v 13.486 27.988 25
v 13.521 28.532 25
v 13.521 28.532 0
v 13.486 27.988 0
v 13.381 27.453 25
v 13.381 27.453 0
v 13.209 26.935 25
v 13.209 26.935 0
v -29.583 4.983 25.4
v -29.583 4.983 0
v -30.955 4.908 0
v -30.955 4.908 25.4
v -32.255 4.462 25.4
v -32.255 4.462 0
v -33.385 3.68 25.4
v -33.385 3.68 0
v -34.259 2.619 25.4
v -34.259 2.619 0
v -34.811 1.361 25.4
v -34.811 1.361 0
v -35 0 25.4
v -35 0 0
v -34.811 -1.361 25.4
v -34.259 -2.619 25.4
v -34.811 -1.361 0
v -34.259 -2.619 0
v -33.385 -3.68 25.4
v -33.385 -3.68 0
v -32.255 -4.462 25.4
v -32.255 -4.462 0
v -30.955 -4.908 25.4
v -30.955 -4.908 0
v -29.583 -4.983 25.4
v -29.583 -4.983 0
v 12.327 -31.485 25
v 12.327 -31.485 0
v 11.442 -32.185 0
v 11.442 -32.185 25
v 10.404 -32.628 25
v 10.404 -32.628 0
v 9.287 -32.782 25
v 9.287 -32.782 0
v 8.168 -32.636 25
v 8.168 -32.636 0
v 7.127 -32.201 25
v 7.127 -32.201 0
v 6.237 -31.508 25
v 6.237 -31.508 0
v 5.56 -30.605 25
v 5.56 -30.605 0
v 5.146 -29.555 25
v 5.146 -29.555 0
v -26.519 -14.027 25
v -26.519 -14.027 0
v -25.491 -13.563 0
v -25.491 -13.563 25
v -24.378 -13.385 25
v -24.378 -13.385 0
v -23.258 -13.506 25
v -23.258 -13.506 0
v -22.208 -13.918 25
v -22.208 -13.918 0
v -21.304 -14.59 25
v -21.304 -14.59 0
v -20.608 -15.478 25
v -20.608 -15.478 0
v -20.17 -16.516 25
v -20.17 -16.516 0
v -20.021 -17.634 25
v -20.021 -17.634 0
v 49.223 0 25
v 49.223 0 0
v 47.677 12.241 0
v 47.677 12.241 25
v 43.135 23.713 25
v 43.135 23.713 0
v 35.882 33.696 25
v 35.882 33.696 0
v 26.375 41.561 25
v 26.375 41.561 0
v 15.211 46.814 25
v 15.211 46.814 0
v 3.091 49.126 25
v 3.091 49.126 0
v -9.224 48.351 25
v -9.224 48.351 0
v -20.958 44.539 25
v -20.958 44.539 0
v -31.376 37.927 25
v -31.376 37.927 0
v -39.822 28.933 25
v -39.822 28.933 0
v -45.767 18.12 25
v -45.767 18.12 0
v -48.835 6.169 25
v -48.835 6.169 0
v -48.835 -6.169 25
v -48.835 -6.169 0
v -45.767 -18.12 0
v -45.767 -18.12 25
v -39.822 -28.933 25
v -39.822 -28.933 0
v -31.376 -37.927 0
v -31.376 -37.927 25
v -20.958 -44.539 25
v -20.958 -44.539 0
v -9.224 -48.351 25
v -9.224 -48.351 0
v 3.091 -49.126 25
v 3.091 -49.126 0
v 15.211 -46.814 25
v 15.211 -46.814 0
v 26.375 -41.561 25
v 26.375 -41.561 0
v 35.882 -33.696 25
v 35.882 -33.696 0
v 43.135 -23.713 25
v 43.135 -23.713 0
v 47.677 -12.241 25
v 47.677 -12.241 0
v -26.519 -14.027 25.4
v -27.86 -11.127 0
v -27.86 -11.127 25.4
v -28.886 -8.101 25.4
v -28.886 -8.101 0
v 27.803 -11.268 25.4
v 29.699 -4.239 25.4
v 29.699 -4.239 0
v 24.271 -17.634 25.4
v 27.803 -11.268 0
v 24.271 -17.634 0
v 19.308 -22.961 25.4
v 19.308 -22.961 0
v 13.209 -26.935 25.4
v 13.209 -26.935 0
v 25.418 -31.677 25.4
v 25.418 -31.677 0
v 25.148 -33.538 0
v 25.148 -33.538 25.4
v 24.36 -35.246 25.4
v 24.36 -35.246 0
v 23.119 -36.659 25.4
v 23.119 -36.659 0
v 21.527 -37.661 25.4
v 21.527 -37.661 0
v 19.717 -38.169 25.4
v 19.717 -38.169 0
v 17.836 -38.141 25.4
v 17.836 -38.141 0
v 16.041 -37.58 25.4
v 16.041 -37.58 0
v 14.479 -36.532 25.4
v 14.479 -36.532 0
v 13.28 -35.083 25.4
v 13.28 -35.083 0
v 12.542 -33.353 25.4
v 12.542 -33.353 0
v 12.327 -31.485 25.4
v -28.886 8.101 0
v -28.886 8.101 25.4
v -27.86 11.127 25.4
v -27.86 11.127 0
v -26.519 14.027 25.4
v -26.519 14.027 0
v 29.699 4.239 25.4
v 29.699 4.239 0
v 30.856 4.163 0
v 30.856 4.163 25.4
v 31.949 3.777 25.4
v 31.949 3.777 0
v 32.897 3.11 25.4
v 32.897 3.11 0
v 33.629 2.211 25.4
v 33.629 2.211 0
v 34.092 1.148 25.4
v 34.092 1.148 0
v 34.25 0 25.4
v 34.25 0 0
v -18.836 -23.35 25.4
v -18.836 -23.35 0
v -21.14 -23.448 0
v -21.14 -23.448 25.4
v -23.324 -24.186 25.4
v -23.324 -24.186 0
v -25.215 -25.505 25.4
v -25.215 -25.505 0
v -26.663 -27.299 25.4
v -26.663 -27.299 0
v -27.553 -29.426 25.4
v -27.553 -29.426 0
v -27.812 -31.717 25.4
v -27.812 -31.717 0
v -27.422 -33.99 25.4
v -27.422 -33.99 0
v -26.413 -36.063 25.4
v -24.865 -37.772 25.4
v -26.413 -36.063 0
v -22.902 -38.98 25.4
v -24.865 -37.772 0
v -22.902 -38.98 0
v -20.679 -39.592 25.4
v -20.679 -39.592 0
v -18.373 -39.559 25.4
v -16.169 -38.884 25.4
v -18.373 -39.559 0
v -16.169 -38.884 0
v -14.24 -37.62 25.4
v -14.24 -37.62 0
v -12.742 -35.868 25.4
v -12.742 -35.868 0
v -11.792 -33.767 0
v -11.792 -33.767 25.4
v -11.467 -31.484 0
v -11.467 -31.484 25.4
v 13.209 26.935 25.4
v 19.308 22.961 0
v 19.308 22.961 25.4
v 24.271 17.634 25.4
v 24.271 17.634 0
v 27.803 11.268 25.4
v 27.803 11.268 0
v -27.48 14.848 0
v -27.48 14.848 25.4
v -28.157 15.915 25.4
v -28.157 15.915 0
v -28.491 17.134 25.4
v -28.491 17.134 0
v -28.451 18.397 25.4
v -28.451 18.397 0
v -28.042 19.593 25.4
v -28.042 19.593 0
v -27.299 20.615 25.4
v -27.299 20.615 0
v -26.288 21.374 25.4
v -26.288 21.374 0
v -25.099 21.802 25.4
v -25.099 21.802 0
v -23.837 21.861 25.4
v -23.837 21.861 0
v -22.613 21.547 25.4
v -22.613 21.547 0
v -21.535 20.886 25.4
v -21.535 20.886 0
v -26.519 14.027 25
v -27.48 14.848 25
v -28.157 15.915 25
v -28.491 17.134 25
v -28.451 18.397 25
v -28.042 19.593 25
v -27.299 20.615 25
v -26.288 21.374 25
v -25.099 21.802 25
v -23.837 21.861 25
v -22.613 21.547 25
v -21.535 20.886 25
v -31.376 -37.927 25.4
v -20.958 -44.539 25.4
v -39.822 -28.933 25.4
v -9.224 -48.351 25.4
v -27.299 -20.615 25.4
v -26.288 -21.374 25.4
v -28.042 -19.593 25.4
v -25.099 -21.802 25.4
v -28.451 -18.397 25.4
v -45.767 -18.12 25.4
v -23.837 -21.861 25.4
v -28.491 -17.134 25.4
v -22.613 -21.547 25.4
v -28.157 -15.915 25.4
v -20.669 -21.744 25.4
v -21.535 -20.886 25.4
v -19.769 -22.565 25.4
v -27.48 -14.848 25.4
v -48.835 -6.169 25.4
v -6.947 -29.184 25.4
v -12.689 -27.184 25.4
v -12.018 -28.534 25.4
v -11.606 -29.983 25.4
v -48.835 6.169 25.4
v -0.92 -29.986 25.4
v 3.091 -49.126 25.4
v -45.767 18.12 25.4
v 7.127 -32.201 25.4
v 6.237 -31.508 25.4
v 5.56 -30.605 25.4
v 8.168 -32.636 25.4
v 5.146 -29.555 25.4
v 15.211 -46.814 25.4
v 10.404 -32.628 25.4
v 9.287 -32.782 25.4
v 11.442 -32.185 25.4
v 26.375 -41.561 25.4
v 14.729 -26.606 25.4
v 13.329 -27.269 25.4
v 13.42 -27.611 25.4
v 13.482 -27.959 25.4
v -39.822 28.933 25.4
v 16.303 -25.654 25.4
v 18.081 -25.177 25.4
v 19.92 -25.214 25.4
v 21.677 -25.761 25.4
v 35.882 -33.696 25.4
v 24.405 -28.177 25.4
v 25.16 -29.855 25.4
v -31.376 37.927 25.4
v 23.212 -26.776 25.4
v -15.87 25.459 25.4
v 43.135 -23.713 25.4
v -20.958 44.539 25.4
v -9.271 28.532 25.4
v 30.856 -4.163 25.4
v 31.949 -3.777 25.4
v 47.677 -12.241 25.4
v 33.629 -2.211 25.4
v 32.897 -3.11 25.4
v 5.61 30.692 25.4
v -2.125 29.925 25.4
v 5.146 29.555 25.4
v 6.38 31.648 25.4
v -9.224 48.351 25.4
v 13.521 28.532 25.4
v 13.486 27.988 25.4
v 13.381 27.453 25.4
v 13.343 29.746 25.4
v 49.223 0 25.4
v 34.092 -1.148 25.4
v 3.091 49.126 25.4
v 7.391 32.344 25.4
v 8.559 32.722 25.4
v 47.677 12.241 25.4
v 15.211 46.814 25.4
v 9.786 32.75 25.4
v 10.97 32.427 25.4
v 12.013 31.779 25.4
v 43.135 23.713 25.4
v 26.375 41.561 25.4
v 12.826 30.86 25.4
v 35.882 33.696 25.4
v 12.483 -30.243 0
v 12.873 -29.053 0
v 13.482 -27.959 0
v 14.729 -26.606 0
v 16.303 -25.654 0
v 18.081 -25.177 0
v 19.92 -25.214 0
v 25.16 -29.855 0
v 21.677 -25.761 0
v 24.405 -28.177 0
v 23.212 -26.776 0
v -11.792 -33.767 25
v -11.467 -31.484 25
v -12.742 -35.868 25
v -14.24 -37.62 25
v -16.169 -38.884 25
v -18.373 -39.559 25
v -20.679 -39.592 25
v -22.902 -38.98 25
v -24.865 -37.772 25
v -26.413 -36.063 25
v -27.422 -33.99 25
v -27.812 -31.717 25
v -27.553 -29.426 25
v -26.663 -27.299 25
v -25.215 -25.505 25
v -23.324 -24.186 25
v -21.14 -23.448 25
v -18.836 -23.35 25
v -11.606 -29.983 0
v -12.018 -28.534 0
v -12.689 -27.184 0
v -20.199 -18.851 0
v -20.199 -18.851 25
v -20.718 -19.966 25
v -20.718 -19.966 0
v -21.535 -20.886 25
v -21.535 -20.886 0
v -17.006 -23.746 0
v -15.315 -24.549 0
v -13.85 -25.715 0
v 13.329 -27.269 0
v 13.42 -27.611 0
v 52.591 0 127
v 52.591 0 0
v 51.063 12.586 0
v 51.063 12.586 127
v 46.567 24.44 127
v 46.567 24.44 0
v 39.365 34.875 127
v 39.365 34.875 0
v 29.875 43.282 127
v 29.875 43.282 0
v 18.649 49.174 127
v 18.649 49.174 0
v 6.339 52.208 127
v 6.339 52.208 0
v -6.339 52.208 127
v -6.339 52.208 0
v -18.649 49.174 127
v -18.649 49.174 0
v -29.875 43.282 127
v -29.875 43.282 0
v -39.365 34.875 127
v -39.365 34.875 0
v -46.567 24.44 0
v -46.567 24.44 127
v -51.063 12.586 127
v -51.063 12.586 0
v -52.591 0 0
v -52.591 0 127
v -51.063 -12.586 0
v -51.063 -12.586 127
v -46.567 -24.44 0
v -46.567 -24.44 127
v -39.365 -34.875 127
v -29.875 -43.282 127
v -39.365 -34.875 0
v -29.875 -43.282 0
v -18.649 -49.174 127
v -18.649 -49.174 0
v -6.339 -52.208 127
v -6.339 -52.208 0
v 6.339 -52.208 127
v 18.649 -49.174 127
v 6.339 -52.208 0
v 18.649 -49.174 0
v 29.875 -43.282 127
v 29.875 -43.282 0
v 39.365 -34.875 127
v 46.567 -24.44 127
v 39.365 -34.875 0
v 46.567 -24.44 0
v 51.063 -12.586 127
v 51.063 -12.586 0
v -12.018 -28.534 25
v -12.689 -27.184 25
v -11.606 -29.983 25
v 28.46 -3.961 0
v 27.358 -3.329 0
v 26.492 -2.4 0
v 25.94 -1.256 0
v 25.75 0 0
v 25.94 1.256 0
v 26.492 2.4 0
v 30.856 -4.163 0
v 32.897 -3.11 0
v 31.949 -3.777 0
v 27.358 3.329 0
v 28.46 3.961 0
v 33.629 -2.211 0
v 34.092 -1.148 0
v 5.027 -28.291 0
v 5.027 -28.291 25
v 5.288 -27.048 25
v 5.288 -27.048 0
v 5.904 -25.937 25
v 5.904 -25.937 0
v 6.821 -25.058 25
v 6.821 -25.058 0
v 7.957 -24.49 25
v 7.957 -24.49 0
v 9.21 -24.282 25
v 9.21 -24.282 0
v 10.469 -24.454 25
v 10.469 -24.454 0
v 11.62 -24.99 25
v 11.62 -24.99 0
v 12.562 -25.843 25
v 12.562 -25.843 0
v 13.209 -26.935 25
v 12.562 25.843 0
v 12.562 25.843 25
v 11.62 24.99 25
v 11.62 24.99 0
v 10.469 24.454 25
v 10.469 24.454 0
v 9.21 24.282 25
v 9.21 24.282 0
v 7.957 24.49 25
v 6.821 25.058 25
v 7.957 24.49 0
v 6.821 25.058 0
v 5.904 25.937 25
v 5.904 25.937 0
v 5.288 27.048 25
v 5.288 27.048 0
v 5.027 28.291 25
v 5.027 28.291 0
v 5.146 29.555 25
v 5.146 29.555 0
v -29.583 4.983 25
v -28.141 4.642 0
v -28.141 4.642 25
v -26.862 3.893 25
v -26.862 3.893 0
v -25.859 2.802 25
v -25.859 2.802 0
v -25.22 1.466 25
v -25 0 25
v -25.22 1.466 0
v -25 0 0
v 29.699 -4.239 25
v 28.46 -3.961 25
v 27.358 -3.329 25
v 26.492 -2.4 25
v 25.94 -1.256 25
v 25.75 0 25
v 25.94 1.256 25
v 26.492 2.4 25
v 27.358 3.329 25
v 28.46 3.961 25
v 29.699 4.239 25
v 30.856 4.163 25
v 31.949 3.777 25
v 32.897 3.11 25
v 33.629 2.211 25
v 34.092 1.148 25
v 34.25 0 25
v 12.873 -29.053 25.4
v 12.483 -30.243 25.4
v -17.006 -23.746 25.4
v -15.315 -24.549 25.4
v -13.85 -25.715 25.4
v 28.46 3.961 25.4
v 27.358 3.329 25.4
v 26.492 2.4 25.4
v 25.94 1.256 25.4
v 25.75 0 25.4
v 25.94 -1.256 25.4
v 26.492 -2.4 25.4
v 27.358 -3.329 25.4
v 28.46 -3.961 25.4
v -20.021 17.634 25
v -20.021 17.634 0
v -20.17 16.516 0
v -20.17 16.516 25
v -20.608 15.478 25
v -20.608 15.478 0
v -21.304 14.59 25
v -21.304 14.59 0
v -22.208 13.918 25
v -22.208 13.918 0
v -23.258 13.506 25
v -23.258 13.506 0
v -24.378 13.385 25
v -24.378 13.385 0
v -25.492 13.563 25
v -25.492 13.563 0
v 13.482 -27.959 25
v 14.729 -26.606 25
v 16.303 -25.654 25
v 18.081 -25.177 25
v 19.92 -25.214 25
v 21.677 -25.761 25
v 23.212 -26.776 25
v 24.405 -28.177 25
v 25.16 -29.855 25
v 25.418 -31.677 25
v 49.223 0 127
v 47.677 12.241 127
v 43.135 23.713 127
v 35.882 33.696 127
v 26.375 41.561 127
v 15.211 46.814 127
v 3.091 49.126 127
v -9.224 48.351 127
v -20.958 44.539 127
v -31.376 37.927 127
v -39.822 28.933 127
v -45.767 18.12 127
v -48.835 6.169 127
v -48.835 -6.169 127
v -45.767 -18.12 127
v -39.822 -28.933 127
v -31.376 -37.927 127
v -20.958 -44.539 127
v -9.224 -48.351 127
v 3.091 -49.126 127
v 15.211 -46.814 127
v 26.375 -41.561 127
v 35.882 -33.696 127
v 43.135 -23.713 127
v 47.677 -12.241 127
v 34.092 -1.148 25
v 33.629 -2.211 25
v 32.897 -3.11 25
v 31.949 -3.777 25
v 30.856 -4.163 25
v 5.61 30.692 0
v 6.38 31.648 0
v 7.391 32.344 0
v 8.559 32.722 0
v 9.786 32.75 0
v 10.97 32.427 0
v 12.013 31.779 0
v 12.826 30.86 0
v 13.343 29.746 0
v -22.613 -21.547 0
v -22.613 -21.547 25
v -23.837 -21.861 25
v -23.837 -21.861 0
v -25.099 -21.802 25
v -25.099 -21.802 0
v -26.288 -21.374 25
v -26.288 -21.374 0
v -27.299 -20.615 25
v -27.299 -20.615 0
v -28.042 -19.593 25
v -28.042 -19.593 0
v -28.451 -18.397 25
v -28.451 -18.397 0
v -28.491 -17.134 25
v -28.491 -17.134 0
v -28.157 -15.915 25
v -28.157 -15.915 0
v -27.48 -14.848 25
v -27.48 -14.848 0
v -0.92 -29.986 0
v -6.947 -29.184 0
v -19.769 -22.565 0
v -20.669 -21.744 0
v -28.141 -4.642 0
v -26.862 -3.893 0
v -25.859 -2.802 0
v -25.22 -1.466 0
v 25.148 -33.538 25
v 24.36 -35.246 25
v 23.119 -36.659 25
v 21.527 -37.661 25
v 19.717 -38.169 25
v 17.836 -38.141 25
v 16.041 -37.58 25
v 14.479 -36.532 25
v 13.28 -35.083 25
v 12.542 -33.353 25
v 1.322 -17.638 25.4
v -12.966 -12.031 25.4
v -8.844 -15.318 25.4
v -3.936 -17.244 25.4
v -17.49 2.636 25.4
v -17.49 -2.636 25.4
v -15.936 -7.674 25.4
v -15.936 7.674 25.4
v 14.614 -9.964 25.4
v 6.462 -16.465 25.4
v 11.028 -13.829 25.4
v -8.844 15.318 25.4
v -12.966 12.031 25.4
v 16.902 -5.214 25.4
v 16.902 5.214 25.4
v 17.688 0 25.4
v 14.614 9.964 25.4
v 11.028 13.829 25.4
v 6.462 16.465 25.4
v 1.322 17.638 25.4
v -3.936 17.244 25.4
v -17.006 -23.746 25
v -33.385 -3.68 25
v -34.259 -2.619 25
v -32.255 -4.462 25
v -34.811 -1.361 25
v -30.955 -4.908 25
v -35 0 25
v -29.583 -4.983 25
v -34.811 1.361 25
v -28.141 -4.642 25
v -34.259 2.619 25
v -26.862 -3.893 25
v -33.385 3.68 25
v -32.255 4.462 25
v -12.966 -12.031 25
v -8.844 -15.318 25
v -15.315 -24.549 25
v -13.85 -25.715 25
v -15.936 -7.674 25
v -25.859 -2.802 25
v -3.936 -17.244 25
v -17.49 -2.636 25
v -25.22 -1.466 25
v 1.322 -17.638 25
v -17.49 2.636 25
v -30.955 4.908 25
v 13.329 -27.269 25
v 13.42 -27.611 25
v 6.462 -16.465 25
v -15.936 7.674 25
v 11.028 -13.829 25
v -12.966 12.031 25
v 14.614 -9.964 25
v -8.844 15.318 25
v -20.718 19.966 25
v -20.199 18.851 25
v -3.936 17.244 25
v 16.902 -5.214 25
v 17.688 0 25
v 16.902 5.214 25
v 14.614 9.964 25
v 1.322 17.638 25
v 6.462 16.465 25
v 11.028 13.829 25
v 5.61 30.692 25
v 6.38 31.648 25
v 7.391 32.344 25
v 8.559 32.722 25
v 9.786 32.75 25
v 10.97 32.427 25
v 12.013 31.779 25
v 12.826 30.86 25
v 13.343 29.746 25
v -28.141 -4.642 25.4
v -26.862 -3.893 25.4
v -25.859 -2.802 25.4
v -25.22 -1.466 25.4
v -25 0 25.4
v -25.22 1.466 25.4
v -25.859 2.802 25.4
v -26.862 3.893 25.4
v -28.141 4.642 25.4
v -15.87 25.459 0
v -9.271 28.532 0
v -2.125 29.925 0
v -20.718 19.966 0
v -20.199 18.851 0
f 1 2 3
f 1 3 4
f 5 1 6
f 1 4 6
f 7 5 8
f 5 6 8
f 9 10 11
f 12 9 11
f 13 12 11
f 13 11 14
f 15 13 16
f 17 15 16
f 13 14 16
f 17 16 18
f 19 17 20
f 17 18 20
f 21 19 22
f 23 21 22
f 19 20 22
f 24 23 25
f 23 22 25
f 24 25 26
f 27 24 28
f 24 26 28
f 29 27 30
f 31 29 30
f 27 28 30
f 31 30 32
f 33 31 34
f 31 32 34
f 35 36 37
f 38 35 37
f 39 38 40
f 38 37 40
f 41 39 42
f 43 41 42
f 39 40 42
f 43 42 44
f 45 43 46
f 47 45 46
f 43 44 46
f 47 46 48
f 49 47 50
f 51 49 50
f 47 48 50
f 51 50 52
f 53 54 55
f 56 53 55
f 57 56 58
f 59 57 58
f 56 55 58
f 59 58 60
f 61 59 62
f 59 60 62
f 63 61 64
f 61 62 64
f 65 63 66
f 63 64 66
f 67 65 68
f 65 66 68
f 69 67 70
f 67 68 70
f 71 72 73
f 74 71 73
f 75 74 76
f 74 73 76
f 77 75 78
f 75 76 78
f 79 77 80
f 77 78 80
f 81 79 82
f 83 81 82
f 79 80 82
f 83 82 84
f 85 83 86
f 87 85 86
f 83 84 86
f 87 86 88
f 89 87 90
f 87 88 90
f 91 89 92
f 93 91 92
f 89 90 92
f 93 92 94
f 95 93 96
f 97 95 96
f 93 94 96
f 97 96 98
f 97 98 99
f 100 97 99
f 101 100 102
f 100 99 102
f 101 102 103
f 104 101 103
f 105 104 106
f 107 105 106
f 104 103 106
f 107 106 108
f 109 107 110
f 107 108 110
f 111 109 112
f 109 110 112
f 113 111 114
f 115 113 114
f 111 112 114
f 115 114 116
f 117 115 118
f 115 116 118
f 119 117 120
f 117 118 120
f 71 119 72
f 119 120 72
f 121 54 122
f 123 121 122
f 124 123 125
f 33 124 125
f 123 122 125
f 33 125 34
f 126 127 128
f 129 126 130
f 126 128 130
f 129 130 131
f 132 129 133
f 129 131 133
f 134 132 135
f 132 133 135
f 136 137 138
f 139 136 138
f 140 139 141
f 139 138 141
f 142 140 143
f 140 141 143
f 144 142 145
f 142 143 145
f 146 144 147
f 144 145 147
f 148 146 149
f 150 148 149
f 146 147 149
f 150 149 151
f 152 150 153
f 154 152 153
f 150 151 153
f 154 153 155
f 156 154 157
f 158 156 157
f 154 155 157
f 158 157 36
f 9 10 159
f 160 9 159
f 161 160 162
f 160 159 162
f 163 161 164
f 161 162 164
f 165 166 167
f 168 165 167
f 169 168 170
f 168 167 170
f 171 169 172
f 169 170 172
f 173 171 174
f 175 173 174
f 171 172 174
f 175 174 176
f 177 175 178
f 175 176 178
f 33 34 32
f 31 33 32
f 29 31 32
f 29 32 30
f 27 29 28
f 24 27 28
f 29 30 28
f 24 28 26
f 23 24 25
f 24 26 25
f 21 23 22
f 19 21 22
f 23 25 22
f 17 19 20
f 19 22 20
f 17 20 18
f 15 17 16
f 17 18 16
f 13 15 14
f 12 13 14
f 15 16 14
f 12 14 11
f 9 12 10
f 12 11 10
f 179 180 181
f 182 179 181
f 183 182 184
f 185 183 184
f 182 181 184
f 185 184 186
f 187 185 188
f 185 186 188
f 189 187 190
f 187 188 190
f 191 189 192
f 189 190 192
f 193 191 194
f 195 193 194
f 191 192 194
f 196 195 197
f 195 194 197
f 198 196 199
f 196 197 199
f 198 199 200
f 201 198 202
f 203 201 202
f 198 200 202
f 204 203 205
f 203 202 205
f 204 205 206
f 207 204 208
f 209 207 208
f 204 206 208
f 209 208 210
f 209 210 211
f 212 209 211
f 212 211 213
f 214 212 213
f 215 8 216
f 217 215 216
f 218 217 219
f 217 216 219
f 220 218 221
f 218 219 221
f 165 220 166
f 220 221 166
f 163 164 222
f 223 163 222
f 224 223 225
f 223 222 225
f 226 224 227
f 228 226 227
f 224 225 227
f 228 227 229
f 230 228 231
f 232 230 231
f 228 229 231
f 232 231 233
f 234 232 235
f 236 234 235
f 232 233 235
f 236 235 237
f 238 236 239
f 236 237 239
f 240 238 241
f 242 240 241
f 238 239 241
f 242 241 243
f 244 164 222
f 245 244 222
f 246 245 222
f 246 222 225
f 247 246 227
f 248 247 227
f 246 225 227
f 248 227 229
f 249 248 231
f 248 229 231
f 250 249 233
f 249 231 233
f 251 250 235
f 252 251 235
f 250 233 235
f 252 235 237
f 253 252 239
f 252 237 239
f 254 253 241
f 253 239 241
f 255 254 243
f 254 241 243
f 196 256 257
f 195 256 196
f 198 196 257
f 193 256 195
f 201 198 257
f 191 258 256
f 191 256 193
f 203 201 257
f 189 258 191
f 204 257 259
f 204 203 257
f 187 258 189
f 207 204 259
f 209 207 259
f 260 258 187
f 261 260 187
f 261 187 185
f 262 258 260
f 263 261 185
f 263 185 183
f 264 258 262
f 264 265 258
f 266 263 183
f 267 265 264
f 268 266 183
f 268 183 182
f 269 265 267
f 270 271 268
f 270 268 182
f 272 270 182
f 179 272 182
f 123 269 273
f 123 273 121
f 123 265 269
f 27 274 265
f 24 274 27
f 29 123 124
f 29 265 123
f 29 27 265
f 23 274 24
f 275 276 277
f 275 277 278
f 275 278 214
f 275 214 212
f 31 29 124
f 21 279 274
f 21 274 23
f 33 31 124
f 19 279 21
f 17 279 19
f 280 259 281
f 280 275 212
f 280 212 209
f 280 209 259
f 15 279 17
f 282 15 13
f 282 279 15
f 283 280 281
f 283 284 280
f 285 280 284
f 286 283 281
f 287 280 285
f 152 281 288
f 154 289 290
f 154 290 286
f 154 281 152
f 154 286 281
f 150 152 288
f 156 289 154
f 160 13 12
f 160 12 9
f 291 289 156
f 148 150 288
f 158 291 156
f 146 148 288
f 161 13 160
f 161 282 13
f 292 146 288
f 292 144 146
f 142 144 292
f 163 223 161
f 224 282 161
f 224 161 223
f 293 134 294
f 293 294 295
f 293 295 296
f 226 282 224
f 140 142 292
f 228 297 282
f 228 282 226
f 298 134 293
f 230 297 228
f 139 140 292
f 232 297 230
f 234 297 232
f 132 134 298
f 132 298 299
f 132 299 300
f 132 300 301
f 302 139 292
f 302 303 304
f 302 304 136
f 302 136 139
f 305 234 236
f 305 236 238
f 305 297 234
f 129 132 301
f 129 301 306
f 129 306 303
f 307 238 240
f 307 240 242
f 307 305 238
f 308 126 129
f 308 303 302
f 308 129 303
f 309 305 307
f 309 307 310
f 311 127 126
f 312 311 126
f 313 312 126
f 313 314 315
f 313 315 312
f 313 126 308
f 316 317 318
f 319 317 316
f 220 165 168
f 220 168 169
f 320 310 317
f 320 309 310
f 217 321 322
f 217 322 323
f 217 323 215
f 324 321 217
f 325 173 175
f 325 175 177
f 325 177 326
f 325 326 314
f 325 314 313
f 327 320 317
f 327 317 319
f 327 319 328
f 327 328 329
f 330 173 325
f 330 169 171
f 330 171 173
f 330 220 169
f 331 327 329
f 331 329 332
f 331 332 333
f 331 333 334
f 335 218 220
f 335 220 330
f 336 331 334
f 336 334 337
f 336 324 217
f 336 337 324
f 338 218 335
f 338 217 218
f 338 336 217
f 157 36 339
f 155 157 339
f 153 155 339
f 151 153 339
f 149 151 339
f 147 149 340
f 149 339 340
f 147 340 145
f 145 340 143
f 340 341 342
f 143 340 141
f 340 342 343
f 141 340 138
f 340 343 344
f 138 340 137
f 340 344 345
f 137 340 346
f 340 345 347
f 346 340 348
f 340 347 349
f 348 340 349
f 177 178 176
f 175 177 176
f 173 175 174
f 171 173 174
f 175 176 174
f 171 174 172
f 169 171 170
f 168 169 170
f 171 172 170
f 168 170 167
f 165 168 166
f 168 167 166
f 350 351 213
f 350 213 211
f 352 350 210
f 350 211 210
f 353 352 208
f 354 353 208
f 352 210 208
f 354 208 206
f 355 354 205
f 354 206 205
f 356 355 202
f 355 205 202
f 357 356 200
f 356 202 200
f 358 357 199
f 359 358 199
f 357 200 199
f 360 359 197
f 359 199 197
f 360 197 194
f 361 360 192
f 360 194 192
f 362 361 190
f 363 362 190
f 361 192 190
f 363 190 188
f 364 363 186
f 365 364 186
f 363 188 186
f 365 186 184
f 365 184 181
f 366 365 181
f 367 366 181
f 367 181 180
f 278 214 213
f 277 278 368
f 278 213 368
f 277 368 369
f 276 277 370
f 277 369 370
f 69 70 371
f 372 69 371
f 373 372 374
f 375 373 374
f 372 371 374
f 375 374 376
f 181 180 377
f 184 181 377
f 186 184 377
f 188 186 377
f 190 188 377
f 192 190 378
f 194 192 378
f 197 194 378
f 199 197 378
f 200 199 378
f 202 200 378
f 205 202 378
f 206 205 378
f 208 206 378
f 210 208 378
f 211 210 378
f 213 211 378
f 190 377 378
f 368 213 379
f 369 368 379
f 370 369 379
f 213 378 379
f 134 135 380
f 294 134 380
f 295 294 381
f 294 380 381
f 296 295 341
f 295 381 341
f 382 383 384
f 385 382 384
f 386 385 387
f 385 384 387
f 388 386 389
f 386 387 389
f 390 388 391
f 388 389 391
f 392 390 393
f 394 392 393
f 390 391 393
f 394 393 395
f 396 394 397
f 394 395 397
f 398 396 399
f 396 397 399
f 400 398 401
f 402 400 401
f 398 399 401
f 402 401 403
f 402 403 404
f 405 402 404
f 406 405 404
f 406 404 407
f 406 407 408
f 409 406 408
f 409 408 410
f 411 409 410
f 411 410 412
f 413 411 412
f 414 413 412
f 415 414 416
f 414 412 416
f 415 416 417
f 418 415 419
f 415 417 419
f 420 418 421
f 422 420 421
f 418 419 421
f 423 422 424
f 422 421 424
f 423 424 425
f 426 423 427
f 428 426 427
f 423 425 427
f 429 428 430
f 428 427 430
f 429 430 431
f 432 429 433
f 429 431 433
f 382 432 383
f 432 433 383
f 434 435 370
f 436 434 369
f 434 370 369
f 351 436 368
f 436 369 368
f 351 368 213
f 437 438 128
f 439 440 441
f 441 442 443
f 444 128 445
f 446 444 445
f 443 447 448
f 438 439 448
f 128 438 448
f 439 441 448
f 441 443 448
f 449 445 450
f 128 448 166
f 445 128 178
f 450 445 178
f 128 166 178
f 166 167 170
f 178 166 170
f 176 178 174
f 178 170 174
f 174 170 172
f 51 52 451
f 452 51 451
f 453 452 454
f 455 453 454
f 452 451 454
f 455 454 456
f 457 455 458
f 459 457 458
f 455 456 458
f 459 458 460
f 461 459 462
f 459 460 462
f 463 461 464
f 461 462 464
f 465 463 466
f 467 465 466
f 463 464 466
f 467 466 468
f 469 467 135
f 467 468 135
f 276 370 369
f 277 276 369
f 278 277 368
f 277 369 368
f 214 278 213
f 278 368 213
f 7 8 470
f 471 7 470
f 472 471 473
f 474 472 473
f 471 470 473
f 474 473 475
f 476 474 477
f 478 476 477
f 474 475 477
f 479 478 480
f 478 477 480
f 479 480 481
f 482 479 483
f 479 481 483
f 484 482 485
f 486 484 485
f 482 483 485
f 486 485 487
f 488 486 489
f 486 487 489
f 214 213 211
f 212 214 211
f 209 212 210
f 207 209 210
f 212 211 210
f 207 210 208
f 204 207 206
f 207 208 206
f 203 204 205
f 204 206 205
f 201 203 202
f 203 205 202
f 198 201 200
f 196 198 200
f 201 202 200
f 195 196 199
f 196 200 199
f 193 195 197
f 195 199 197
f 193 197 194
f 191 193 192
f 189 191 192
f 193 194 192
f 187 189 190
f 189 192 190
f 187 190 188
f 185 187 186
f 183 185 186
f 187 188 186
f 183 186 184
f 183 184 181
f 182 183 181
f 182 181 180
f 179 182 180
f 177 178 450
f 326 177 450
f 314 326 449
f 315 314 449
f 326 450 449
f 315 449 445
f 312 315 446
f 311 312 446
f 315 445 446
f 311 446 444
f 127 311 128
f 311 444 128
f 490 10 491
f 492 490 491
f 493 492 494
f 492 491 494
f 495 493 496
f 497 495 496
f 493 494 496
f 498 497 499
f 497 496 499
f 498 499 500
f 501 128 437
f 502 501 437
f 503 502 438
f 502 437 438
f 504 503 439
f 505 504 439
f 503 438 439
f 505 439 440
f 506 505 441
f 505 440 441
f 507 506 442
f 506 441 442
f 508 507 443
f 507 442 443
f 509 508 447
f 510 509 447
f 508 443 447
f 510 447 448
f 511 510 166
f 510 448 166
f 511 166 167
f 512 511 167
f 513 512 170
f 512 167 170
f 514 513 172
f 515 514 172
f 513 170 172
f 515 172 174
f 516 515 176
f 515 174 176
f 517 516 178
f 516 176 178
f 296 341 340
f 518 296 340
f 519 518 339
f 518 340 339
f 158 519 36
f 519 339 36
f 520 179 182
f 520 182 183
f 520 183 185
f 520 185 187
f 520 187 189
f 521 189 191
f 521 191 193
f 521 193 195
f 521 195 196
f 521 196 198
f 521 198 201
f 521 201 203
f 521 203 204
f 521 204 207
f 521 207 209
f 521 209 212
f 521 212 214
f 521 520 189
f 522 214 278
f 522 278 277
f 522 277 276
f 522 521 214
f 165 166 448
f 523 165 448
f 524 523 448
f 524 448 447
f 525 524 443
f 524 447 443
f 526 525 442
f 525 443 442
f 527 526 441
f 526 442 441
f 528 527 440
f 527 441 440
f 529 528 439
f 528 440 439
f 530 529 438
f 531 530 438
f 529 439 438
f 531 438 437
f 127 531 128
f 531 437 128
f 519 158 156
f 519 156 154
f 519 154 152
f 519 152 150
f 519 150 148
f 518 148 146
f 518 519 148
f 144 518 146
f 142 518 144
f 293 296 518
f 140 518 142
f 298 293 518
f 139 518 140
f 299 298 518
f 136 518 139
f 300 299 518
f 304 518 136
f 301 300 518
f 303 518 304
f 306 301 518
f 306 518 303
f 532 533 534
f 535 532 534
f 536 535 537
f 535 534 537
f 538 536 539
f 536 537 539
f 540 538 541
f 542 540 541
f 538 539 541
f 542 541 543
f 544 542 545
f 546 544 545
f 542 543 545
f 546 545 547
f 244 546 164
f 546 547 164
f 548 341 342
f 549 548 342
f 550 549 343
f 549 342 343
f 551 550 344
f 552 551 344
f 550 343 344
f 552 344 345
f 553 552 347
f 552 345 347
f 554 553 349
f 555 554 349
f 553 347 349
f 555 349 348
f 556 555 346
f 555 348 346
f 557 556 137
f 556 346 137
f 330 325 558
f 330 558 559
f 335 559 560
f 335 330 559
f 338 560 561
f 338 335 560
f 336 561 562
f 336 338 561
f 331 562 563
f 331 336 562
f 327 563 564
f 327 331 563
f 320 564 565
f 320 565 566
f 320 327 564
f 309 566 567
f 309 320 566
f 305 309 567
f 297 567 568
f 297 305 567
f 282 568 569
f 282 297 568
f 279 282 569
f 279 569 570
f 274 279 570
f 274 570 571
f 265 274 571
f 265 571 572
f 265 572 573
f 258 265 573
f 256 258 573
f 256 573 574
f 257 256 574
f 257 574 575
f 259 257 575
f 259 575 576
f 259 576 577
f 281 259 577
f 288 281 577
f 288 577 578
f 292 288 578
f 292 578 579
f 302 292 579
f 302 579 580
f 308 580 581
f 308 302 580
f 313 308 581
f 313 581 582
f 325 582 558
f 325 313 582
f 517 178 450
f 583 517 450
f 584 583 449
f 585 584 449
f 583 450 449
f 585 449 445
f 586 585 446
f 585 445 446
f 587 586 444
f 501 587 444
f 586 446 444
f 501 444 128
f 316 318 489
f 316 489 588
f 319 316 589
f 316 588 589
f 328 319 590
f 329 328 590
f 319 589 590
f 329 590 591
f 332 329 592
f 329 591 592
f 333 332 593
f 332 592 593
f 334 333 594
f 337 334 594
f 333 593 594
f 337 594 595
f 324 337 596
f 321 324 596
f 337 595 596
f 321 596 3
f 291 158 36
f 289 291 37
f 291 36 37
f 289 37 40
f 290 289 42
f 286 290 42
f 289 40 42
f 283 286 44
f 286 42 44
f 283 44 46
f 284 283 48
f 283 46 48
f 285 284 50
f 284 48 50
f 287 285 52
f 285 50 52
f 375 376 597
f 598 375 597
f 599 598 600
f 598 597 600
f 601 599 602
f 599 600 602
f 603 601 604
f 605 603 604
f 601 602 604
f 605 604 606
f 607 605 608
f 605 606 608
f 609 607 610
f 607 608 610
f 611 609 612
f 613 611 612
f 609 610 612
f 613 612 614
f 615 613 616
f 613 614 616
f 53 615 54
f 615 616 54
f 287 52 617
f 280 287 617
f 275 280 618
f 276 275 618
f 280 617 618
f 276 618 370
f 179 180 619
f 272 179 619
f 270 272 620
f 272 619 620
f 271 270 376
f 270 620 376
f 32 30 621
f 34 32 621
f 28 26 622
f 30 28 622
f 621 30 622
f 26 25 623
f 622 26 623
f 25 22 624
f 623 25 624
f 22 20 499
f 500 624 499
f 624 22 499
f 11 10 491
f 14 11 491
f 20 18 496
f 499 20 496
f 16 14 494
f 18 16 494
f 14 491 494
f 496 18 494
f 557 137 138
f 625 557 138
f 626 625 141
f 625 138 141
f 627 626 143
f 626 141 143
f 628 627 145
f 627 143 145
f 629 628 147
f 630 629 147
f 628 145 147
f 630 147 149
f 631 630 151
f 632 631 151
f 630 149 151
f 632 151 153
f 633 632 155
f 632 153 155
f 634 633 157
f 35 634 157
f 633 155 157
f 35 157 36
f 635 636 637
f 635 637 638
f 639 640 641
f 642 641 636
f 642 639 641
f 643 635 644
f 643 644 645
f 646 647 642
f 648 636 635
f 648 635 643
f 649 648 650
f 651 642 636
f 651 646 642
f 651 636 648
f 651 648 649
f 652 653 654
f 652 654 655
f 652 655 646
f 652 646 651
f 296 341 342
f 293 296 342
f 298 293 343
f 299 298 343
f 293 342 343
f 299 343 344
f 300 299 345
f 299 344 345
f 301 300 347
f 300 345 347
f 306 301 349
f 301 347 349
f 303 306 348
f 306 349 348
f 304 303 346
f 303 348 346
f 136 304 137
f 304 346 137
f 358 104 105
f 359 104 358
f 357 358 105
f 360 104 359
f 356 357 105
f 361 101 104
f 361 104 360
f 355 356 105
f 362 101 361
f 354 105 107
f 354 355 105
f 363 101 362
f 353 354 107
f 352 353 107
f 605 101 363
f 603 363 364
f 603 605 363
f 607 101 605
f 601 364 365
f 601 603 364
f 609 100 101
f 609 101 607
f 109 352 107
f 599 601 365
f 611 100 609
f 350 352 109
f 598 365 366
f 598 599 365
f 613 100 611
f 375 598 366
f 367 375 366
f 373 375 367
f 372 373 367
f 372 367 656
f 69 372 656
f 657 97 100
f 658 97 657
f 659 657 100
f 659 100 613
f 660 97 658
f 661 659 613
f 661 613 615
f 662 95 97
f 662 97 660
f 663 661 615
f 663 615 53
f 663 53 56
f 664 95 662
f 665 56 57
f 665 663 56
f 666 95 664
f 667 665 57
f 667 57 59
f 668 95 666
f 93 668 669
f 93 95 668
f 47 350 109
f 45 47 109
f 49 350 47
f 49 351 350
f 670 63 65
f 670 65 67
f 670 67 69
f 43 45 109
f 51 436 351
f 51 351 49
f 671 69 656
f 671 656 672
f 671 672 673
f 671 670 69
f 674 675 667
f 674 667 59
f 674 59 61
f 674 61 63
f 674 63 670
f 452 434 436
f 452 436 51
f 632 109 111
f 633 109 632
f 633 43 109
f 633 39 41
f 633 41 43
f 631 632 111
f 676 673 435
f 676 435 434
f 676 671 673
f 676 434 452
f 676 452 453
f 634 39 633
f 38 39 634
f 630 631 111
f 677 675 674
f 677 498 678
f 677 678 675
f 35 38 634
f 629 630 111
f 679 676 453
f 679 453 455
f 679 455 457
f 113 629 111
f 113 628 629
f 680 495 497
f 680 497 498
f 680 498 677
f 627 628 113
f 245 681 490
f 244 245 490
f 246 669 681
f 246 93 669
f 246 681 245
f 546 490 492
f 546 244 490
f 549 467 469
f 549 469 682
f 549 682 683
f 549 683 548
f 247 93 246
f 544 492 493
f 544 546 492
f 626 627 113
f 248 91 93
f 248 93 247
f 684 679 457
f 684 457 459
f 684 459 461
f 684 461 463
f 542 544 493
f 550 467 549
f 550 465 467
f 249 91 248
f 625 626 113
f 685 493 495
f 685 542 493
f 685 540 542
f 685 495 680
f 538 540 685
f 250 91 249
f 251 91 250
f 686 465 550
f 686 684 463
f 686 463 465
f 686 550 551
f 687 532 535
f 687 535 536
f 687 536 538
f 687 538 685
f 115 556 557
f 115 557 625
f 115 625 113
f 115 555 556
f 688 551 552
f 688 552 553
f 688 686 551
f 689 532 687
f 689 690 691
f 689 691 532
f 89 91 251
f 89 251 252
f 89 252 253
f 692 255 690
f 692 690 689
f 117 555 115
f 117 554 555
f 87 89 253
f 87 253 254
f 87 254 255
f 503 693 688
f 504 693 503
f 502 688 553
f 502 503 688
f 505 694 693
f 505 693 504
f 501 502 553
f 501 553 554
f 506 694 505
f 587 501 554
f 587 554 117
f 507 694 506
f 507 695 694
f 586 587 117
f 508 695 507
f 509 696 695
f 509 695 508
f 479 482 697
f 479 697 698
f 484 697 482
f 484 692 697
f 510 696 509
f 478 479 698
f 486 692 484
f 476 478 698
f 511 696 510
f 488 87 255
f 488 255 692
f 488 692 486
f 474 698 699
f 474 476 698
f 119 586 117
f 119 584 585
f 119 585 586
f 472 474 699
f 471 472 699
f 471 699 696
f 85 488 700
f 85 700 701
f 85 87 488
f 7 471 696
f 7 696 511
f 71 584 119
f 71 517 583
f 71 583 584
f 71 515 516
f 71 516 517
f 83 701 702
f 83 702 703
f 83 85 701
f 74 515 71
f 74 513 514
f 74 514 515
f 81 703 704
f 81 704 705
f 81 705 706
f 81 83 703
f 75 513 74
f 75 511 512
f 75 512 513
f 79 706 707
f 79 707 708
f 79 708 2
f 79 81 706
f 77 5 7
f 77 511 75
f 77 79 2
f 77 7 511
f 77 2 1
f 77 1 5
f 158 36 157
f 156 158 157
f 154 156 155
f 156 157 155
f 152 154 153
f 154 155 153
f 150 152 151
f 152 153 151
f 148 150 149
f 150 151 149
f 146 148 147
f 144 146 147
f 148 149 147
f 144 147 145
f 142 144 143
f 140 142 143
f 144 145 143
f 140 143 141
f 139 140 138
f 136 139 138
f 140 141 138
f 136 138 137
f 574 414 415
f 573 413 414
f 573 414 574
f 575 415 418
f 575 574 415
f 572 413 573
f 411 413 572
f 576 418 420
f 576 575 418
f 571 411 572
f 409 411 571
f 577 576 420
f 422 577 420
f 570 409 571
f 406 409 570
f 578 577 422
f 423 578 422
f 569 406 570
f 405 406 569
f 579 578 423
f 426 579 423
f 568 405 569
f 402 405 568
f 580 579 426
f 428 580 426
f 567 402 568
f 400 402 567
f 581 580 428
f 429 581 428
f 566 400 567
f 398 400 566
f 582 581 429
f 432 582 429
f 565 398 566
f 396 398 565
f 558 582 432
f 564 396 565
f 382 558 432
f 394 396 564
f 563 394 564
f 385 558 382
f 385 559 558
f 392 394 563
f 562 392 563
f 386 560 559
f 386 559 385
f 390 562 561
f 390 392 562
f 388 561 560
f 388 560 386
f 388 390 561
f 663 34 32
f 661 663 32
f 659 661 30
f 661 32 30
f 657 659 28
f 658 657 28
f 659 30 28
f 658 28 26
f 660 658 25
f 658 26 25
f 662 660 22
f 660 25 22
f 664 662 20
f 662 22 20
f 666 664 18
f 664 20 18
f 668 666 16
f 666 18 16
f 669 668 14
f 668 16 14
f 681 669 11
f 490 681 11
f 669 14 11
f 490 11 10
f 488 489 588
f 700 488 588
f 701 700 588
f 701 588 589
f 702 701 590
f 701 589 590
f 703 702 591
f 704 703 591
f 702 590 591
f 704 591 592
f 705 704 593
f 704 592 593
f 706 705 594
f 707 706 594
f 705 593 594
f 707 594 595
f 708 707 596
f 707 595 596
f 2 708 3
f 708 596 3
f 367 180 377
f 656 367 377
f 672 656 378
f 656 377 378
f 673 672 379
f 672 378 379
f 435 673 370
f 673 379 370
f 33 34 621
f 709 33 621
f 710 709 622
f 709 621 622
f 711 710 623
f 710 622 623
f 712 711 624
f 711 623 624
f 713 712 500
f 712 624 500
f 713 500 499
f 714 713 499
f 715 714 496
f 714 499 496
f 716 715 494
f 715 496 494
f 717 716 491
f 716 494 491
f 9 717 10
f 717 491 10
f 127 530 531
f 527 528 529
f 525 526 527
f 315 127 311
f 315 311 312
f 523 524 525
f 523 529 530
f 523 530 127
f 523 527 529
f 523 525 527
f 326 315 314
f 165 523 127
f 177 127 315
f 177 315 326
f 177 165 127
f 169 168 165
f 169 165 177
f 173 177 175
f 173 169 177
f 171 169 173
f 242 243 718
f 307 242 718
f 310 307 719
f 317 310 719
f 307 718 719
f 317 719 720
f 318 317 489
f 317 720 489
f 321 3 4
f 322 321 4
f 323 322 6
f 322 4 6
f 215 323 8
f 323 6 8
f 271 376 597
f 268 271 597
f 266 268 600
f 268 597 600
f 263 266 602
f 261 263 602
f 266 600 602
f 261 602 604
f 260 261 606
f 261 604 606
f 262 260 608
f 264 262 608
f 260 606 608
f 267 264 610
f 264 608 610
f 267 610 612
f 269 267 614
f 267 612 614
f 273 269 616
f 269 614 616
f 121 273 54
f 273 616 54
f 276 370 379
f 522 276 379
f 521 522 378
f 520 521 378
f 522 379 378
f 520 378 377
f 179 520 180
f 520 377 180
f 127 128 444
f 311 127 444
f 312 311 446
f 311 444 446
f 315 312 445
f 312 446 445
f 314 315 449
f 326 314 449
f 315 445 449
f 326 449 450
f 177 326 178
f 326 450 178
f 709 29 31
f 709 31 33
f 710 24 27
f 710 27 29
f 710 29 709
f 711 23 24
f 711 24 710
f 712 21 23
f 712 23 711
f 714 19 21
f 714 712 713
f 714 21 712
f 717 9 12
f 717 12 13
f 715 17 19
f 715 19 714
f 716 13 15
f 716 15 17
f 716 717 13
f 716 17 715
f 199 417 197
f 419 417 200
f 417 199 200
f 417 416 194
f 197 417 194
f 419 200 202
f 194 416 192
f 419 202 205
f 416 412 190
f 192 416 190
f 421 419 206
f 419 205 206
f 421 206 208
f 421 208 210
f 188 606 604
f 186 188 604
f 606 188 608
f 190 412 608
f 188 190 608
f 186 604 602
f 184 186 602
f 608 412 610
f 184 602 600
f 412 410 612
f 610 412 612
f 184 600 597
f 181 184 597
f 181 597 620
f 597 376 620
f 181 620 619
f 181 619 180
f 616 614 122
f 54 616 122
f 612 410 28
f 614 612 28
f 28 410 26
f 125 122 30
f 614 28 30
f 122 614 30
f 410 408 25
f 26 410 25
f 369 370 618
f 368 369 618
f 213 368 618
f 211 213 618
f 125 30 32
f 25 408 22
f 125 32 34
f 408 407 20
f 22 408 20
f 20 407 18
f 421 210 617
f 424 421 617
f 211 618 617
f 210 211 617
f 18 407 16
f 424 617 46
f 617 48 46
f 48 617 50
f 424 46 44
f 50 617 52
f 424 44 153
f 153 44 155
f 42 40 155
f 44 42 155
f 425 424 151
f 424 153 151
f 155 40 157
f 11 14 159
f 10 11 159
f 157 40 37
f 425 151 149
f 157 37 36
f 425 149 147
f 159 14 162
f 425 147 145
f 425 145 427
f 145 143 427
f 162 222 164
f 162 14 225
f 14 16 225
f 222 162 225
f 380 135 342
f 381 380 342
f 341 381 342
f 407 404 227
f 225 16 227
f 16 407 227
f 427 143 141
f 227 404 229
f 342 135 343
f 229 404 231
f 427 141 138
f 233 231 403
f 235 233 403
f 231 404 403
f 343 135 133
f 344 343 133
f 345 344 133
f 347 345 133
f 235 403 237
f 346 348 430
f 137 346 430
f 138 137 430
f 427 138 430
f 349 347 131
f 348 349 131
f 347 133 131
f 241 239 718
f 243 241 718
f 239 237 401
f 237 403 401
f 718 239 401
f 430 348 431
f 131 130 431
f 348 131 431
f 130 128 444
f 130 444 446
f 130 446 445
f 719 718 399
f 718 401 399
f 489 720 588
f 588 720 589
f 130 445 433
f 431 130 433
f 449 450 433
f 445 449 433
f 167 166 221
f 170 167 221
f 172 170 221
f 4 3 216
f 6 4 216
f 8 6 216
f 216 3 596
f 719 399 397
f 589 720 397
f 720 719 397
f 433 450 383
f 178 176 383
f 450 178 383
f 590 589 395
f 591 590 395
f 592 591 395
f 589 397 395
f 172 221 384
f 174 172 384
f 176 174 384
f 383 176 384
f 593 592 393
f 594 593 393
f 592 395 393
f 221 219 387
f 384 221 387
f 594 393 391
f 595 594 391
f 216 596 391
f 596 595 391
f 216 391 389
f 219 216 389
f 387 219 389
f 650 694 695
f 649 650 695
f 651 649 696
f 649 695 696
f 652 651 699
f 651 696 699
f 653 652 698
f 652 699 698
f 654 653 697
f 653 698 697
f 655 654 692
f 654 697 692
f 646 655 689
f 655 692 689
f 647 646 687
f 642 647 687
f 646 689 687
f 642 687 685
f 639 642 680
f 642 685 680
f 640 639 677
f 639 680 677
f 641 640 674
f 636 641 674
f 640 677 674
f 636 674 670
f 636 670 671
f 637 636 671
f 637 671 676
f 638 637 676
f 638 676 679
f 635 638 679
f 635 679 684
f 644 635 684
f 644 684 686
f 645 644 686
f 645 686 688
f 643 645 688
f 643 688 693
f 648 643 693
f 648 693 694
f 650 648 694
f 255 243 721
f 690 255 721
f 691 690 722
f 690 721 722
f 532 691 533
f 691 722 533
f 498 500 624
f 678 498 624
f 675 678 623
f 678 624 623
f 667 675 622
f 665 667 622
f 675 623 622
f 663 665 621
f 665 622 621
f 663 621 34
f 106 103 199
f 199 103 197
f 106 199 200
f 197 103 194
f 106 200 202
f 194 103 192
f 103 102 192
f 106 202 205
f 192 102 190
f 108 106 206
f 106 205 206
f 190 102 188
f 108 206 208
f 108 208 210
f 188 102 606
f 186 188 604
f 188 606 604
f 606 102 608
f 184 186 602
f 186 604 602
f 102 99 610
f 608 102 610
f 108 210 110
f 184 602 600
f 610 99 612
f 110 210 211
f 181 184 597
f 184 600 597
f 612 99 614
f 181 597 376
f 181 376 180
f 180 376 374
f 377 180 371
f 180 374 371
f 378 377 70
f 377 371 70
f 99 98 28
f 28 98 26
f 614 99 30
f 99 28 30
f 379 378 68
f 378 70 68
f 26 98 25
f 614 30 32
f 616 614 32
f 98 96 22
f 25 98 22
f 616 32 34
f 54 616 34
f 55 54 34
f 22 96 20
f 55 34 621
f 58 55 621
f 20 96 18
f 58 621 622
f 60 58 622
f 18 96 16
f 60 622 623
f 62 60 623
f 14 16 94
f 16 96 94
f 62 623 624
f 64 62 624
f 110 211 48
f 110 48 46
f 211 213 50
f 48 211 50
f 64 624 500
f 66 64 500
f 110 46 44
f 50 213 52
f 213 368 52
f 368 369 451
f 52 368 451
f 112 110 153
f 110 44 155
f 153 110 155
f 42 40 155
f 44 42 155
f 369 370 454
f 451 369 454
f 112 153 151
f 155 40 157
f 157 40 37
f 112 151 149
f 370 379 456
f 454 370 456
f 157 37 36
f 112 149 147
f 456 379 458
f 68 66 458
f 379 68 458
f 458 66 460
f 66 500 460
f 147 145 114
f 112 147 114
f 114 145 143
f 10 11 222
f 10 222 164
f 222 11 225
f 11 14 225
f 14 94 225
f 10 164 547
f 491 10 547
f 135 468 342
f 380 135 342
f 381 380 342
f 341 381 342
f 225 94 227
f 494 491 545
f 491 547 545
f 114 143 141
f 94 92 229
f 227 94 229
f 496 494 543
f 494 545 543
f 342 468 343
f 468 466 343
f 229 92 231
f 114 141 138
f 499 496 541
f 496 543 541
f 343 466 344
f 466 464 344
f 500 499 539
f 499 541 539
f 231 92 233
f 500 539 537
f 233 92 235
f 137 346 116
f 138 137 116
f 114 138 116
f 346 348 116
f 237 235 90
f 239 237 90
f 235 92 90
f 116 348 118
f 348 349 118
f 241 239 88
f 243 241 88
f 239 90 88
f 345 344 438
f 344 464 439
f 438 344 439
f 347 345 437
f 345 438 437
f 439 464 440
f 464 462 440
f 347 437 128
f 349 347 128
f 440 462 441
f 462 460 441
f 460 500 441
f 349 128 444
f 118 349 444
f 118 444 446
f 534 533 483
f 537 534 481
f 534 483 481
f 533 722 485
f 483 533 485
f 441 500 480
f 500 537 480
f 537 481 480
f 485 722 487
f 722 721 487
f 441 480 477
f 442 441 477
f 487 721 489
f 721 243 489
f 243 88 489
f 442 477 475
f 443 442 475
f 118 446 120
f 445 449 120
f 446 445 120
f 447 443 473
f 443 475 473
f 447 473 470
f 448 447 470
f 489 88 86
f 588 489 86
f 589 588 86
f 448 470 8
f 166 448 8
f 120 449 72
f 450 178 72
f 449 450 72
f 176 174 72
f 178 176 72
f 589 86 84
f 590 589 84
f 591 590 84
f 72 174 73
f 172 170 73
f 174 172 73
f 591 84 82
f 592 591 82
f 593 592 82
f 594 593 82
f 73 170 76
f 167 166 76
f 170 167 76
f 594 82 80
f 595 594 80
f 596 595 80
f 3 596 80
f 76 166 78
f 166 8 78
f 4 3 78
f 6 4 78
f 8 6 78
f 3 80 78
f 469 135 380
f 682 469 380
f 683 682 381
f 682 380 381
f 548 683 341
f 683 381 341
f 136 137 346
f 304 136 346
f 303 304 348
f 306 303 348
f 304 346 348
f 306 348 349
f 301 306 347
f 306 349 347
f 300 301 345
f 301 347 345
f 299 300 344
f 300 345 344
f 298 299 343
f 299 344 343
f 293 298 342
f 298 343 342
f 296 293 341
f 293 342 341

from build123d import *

# Parameters (mm, degrees)
F3_DEPTH = 25.4
F0_R     = 49.2232486947
F6_DEPTH = 25.4
F1_R     = 17.687795716
F0_R_2   = 52.5913484354
F7_DEPTH = 127
F9_DEPTH = 25


# Not quite as in the source:
# - a feature names something its author has since deleted; it is built from what else it names


with BuildPart() as f3:
    # F0 (on Top) → F3 (new body)
    with BuildSketch(Plane.XY):
        with BuildLine():
            ThreePointArc((-29.5833333333, -4.982608643), (-30, 0), (-29.5833333333, 4.982608643))
            ThreePointArc((-29.5833333333, 4.982608643), (-35, 0), (-29.5833333333, -4.982608643))
        make_face()
        with BuildLine():
            ThreePointArc((-25, 0), (-26.320099639, 3.3850160019), (-29.5833333333, 4.982608643))
            ThreePointArc((-29.5833333333, 4.982608643), (-30, 0), (-29.5833333333, -4.982608643))
            ThreePointArc((-29.5833333333, -4.982608643), (-26.320099639, -3.3850160019), (-25, 0))
        make_face()
    extrude(amount=F3_DEPTH)


with BuildPart() as f3b:
    # F0 (on Top) → F3, piece 2 (new body)
    with BuildSketch(Plane.XY):
        with BuildLine():
            ThreePointArc((-18.8360994911, -23.3495472325), (-15.8789717039, -25.4530598873), (-12.6894927419, -27.1841272428))
            ThreePointArc((-12.6894927419, -27.1841272428), (-15.3147928366, -24.5487142681), (-18.8360994911, -23.3495472325))
        make_face()
        with BuildLine():
            ThreePointArc((-11.4671403642, -31.4840823412), (-11.7786645812, -29.2489224373), (-12.6894927419, -27.1841272428))
            ThreePointArc((-12.6894927419, -27.1841272428), (-15.8789717039, -25.4530598873), (-18.8360994911, -23.3495472325))
            ThreePointArc((-18.8360994911, -23.3495472325), (-25.699594493, -36.9720742337), (-11.4671403642, -31.4840823412))
        make_face()
    extrude(amount=F3_DEPTH)


with BuildPart() as f3c:
    # F0 (on Top) → F3, piece 3 (new body)
    with BuildSketch(Plane.XY):
        with BuildLine():
            ThreePointArc((13.5205138222, -28.5316941921), (13.5108189409, -28.2447926413), (13.4817785281, -27.9592000205))
            ThreePointArc((13.4817785281, -27.9592000205), (12.6493579809, -29.63852128), (12.3268521898, -31.4848781997))
            ThreePointArc((12.3268521898, -31.4848781997), (13.2108144492, -30.1243432334), (13.5205138222, -28.5316941921))
        make_face()
        with BuildLine():
            ThreePointArc((25.4183405572, -31.6766425967), (20.8179668086, -25.4256248319), (13.4817785281, -27.9592000205))
            ThreePointArc((13.4817785281, -27.9592000205), (13.5108189409, -28.2447926413), (13.5205138222, -28.5316941921))
            ThreePointArc((13.5205138222, -28.5316941921), (13.2108144492, -30.1243432334), (12.3268521898, -31.4848781997))
            ThreePointArc((12.3268521898, -31.4848781997), (18.7752994046, -38.223088985), (25.4183405572, -31.6766425967))
        make_face()
    extrude(amount=F3_DEPTH)


with BuildPart() as f3d:
    # F0 (on Top) → F3, piece 4 (new body)
    with BuildSketch(Plane.XY):
        with BuildLine():
            ThreePointArc((30, 0), (29.9246449436, 2.125), (29.6989583333, 4.2393247003))
            ThreePointArc((29.6989583333, 4.2393247003), (25.75, 0), (29.6989583333, -4.2393247003))
            ThreePointArc((29.6989583333, -4.2393247003), (29.9246449436, -2.125), (30, 0))
        make_face()
        with BuildLine():
            ThreePointArc((29.6989583333, -4.2393247003), (32.8968148816, -3.1098172843), (34.25, 0))
            ThreePointArc((34.25, 0), (32.8968148816, 3.1098172843), (29.6989583333, 4.2393247003))
            ThreePointArc((29.6989583333, 4.2393247003), (29.9246449436, 2.125), (30, 0))
            ThreePointArc((30, 0), (29.9246449436, -2.125), (29.6989583333, -4.2393247003))
        make_face()
    extrude(amount=F3_DEPTH)


with BuildPart() as f6:
    # F0 (on Top) → F6 (new body)
    with BuildSketch(Plane.XY):
        Circle(F0_R)
        with BuildLine():
            ThreePointArc((29.6989583333, 4.2393247003), (32.8968148816, 3.1098172843), (34.25, 0))
            ThreePointArc((34.25, 0), (32.8968148816, -3.1098172843), (29.6989583333, -4.2393247003))
            ThreePointArc((29.6989583333, -4.2393247003), (24.2705110645, -17.6335558713), (13.2093239888, -26.9353626253))
            ThreePointArc((13.2093239888, -26.9353626253), (13.3775797895, -27.4387581739), (13.4817785281, -27.9592000205))
            ThreePointArc((13.4817785281, -27.9592000205), (20.8179668086, -25.4256248319), (25.4183405572, -31.6766425967))
            ThreePointArc((25.4183405572, -31.6766425967), (18.7752994046, -38.223088985), (12.3268521898, -31.4848781997))
            ThreePointArc((12.3268521898, -31.4848781997), (8.1677226938, -32.6361249355), (5.1456495934, -29.5554105074))
            ThreePointArc((5.1456495934, -29.5554105074), (-3.9538763818, -29.7383062994), (-12.6894927419, -27.1841272428))
            ThreePointArc((-12.6894927419, -27.1841272428), (-11.7786645812, -29.2489224373), (-11.4671403642, -31.4840823412))
            ThreePointArc((-11.4671403642, -31.4840823412), (-25.699594493, -36.9720742337), (-18.8360994911, -23.3495472325))
            ThreePointArc((-18.8360994911, -23.3495472325), (-20.2231622396, -22.1590547865), (-21.5351472772, -20.8862977032))
            ThreePointArc((-21.5351472772, -20.8862977032), (-27.7088299454, -20.1316477979), (-26.5187730739, -14.0269267715))
            ThreePointArc((-26.5187730739, -14.0269267715), (-28.4132277018, -9.6274862537), (-29.5833333333, -4.982608643))
            ThreePointArc((-29.5833333333, -4.982608643), (-35, 0), (-29.5833333333, 4.982608643))
            ThreePointArc((-29.5833333333, 4.982608643), (-28.4132285435, 9.6274837697), (-26.5187755265, 14.0269221349))
            ThreePointArc((-26.5187755265, 14.0269221349), (-27.7088334653, 20.1316429531), (-21.5351509291, 20.8862939379))
            ThreePointArc((-21.5351509291, 20.8862939379), (-9.2705113278, 28.5316950026), (5.1456444258, 29.5554114071))
            ThreePointArc((5.1456444258, 29.5554114071), (9.7861764915, 32.7502959205), (13.5205088335, 28.531695813))
            ThreePointArc((13.5205088335, 28.531695813), (13.4419860536, 27.7185059196), (13.2093192793, 26.9353649349))
            ThreePointArc((13.2093192793, 26.9353649349), (24.2705095229, 17.6335579931), (29.6989583333, 4.2393247003))
        make_face(mode=Mode.SUBTRACT)
    extrude(amount=F6_DEPTH)

    # F0 (on Top) → F7 (join)
    with BuildSketch(Plane.XY):
        Circle(F0_R_2)
        Circle(F0_R, mode=Mode.SUBTRACT)
    extrude(amount=F7_DEPTH)


with BuildPart() as f6b:
    # F1 (on Top) → F6, piece 2 (new body)
    with BuildSketch(Plane.XY):
        Circle(F1_R)
    extrude(amount=F6_DEPTH)

    # F0 (on Top) → F9 (join)
    with BuildSketch(Plane.XY):
        Circle(F0_R)
        with BuildLine():
            ThreePointArc((29.6989583333, 4.2393247003), (32.8968148816, 3.1098172843), (34.25, 0))
            ThreePointArc((34.25, 0), (32.8968148816, -3.1098172843), (29.6989583333, -4.2393247003))
            ThreePointArc((29.6989583333, -4.2393247003), (24.2705110645, -17.6335558713), (13.2093239888, -26.9353626253))
            ThreePointArc((13.2093239888, -26.9353626253), (13.3775797895, -27.4387581739), (13.4817785281, -27.9592000205))
            ThreePointArc((13.4817785281, -27.9592000205), (20.8179668086, -25.4256248319), (25.4183405572, -31.6766425967))
            ThreePointArc((25.4183405572, -31.6766425967), (18.7752994046, -38.223088985), (12.3268521898, -31.4848781997))
            ThreePointArc((12.3268521898, -31.4848781997), (8.1677226938, -32.6361249355), (5.1456495934, -29.5554105074))
            ThreePointArc((5.1456495934, -29.5554105074), (-3.9538763818, -29.7383062994), (-12.6894927419, -27.1841272428))
            ThreePointArc((-12.6894927419, -27.1841272428), (-11.7786645812, -29.2489224373), (-11.4671403642, -31.4840823412))
            ThreePointArc((-11.4671403642, -31.4840823412), (-25.699594493, -36.9720742337), (-18.8360994911, -23.3495472325))
            ThreePointArc((-18.8360994911, -23.3495472325), (-20.2231622396, -22.1590547865), (-21.5351472772, -20.8862977032))
            ThreePointArc((-21.5351472772, -20.8862977032), (-27.7088299454, -20.1316477979), (-26.5187730739, -14.0269267715))
            ThreePointArc((-26.5187730739, -14.0269267715), (-28.4132277018, -9.6274862537), (-29.5833333333, -4.982608643))
            ThreePointArc((-29.5833333333, -4.982608643), (-35, 0), (-29.5833333333, 4.982608643))
            ThreePointArc((-29.5833333333, 4.982608643), (-28.4132285435, 9.6274837697), (-26.5187755265, 14.0269221349))
            ThreePointArc((-26.5187755265, 14.0269221349), (-27.7088334653, 20.1316429531), (-21.5351509291, 20.8862939379))
            ThreePointArc((-21.5351509291, 20.8862939379), (-9.2705113278, 28.5316950026), (5.1456444258, 29.5554114071))
            ThreePointArc((5.1456444258, 29.5554114071), (9.7861764915, 32.7502959205), (13.5205088335, 28.531695813))
            ThreePointArc((13.5205088335, 28.531695813), (13.4419860536, 27.7185059196), (13.2093192793, 26.9353649349))
            ThreePointArc((13.2093192793, 26.9353649349), (24.2705095229, 17.6335579931), (29.6989583333, 4.2393247003))
        make_face(mode=Mode.SUBTRACT)
        with BuildLine():
            ThreePointArc((29.6989583333, -4.2393247003), (25.75, 0), (29.6989583333, 4.2393247003))
            ThreePointArc((29.6989583333, 4.2393247003), (24.2705095229, 17.6335579931), (13.2093192793, 26.9353649349))
            ThreePointArc((13.2093192793, 26.9353649349), (7.9571867488, 24.4897055729), (5.1456444258, 29.5554114071))
            ThreePointArc((5.1456444258, 29.5554114071), (-9.2705113278, 28.5316950026), (-21.5351509291, 20.8862939379))
            ThreePointArc((-21.5351509291, 20.8862939379), (-20.4177341066, 19.4276042855), (-20.0205110645, 17.6335558713))
            ThreePointArc((-20.0205110645, 17.6335558713), (-22.2080639698, 13.9175348836), (-26.5187755265, 14.0269221349))
            ThreePointArc((-26.5187755265, 14.0269221349), (-28.4132285435, 9.6274837697), (-29.5833333333, 4.982608643))
            ThreePointArc((-29.5833333333, 4.982608643), (-26.320099639, 3.3850160019), (-25, 0))
            ThreePointArc((-25, 0), (-26.320099639, -3.3850160019), (-29.5833333333, -4.982608643))
            ThreePointArc((-29.5833333333, -4.982608643), (-28.4132277018, -9.6274862537), (-26.5187730739, -14.0269267715))
            ThreePointArc((-26.5187730739, -14.0269267715), (-22.2080612115, -13.9175389468), (-20.0205079814, -17.6335601149))
            ThreePointArc((-20.0205079814, -17.6335601149), (-20.4177308666, -19.4276081922), (-21.5351472772, -20.8862977032))
            ThreePointArc((-21.5351472772, -20.8862977032), (-20.2231622396, -22.1590547865), (-18.8360994911, -23.3495472325))
            ThreePointArc((-18.8360994911, -23.3495472325), (-15.3147928366, -24.5487142681), (-12.6894927419, -27.1841272428))
            ThreePointArc((-12.6894927419, -27.1841272428), (-3.9538763818, -29.7383062994), (5.1456495934, -29.5554105074))
            ThreePointArc((5.1456495934, -29.5554105074), (7.9571910307, -24.4897041816), (13.2093239888, -26.9353626253))
            ThreePointArc((13.2093239888, -26.9353626253), (24.2705110645, -17.6335558713), (29.6989583333, -4.2393247003))
        make_face()
    extrude(amount=F9_DEPTH)


solid = Compound([f3.part, f3b.part, f3c.part, f3d.part, f6.part, f6b.part])
